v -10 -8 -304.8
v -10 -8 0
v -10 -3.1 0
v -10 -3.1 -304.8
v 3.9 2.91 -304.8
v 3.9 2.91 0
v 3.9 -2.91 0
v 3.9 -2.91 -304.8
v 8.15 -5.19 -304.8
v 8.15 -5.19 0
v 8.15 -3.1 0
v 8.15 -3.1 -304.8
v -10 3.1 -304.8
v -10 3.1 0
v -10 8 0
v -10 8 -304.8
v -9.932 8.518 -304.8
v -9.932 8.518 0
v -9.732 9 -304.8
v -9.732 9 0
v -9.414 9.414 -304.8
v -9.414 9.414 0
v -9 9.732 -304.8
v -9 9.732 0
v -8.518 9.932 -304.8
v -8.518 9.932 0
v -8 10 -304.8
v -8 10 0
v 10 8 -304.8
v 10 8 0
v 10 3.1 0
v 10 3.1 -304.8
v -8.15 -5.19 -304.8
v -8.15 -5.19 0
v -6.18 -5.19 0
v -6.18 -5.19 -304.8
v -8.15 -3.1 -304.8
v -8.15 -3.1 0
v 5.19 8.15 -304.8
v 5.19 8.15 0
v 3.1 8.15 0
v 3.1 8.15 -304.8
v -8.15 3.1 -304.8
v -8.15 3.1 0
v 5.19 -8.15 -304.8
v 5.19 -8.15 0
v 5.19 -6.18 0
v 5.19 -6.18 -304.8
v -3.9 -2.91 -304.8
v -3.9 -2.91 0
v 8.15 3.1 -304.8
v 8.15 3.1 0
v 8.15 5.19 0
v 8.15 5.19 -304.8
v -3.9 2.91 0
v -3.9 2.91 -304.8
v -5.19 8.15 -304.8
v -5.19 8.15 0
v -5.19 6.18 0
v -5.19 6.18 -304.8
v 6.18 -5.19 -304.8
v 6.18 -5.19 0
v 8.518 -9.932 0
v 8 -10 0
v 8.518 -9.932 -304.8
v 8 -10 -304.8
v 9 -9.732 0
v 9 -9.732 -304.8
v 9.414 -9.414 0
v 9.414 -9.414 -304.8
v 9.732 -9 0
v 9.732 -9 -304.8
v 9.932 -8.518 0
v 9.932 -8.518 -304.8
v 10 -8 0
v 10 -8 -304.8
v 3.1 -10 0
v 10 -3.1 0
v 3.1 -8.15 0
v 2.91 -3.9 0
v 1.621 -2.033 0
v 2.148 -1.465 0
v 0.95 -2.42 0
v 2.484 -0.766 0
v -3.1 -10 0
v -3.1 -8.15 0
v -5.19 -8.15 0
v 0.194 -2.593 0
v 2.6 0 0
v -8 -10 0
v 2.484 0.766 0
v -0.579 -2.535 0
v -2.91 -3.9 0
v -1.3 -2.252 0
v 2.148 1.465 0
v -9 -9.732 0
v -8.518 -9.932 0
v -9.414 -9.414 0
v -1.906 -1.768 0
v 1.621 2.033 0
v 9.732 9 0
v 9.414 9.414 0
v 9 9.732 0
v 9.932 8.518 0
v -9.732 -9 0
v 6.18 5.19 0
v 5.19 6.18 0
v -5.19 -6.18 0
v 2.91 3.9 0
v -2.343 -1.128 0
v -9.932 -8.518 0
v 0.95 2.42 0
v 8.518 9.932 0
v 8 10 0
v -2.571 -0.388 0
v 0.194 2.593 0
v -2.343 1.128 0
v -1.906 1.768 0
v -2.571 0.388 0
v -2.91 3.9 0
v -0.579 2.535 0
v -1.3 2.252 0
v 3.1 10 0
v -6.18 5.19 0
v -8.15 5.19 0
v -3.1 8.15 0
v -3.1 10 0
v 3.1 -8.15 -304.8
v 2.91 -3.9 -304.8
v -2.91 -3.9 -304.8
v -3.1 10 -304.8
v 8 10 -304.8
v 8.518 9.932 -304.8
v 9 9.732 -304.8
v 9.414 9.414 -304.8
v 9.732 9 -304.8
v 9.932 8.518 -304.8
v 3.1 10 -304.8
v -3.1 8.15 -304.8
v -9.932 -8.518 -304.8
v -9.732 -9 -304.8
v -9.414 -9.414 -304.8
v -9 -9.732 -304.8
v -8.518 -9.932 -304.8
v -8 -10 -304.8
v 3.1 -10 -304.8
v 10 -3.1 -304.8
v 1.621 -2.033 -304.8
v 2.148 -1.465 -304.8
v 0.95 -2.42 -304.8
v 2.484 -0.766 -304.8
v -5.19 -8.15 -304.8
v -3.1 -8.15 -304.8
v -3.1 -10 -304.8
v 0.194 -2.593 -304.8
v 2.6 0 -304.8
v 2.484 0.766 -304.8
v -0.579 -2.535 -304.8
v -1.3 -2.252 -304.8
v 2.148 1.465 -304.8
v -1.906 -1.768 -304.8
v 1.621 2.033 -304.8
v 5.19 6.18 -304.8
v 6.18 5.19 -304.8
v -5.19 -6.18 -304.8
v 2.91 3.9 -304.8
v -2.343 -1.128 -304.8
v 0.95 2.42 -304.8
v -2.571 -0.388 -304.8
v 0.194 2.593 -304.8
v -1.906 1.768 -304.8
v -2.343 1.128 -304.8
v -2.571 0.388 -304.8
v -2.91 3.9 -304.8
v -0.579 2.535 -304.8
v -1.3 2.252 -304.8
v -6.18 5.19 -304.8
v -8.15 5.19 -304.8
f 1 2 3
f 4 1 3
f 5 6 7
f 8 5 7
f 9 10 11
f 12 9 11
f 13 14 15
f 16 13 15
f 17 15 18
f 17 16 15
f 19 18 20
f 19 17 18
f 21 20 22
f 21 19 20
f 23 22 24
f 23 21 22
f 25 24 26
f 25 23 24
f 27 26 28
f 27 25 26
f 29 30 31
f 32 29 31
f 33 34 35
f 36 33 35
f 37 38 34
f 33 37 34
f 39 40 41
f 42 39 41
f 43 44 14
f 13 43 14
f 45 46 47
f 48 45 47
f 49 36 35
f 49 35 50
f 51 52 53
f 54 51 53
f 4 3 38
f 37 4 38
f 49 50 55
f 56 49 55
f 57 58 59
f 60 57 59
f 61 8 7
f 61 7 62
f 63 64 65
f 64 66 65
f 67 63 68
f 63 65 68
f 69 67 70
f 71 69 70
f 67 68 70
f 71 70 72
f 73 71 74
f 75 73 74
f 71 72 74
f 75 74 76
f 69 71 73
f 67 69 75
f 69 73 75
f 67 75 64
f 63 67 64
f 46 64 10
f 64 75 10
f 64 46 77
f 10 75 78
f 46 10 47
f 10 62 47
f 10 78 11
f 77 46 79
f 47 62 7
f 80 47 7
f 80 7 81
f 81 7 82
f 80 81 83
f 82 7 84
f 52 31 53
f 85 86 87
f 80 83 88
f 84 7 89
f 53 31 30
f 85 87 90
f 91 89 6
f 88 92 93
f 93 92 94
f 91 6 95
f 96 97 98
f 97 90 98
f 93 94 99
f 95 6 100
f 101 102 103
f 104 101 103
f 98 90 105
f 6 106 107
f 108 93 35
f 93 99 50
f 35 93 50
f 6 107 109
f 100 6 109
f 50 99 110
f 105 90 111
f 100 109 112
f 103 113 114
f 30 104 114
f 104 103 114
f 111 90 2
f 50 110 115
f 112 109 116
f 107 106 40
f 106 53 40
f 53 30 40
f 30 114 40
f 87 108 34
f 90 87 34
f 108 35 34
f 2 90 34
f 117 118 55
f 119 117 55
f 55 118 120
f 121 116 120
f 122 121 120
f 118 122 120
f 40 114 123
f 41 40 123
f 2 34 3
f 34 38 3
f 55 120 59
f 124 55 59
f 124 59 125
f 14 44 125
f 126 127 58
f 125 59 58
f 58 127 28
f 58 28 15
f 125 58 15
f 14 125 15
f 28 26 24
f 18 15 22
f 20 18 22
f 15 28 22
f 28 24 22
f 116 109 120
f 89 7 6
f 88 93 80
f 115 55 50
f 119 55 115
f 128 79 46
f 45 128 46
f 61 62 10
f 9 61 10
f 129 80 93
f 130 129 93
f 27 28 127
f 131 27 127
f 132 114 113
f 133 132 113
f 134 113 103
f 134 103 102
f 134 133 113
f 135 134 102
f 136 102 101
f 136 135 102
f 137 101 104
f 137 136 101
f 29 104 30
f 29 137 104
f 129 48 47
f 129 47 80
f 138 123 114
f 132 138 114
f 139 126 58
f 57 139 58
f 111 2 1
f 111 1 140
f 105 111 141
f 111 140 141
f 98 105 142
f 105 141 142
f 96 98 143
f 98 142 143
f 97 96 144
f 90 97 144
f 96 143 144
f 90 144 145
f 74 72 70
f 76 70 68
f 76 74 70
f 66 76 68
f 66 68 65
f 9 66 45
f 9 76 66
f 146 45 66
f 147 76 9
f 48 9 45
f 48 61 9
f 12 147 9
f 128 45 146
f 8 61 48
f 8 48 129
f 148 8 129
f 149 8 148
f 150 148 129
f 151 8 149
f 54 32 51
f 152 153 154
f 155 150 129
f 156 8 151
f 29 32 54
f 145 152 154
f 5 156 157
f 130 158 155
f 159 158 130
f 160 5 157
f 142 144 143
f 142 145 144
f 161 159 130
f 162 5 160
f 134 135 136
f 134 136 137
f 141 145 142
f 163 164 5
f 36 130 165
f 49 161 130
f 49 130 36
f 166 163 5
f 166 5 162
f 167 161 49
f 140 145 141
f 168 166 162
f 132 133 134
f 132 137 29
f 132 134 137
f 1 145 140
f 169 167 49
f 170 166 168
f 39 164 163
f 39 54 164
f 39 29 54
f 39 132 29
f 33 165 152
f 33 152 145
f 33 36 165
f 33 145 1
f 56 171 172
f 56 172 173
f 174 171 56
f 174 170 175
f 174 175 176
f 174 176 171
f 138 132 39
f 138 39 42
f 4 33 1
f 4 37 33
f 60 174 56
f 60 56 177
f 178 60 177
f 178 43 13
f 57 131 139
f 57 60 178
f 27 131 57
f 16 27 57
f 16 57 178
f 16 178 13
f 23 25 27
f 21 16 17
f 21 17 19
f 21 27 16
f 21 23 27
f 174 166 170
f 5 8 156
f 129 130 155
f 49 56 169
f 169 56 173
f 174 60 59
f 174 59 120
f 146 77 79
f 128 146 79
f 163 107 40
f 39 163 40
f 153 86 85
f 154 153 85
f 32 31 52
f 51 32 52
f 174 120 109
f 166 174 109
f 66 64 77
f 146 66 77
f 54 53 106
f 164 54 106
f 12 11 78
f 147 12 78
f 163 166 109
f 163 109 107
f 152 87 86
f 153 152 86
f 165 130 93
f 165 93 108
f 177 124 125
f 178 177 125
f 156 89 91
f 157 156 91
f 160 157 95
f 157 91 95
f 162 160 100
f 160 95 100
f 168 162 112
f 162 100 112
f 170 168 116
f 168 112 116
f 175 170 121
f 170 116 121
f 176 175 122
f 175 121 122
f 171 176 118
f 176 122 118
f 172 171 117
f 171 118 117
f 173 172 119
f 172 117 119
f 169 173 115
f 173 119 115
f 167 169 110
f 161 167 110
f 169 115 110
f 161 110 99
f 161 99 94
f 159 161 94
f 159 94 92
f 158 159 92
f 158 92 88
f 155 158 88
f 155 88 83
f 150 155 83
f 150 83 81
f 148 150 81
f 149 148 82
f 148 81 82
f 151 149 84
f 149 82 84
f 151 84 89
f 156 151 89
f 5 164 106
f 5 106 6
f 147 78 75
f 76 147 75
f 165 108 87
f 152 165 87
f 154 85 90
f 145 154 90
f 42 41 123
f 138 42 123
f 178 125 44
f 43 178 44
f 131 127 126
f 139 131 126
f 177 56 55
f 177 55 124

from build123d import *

# Parameters (mm, degrees)
SKETCH1_R           = 2.6
BOSS_EXTRUDE1_DEPTH = 304.8
FILLET1_R           = 2


with BuildPart() as part:
    # Sketch1 → Boss-Extrude1 (new body)
    with BuildSketch(Plane.XY):
        Polygon((-3.9, 2.910050506), (-6.179949494, 5.19), (-8.15, 5.19), (-8.15, 3.1), (-10, 3.1), (-10, 10), (-3.1, 10), (-3.1, 8.15), (-5.19, 8.15), (-5.19, 6.179949494), (-2.910050506, 3.9), (2.910050506, 3.9), (5.19, 6.179949494), (5.19, 8.15), (3.1, 8.15), (3.1, 10), (10, 10), (10, 3.1), (8.15, 3.1), (8.15, 5.19), (6.179949494, 5.19), (3.9, 2.910050506), (3.9, -2.910050506), (6.179949494, -5.19), (8.15, -5.19), (8.15, -3.1), (10, -3.1), (10, -10), (3.1, -10), (3.1, -8.15), (5.19, -8.15), (5.19, -6.179949494), (2.910050506, -3.9), (-2.910050506, -3.9), (-5.19, -6.179949494), (-5.19, -8.15), (-3.1, -8.15), (-3.1, -10), (-10, -10), (-10, -3.1), (-8.15, -3.1), (-8.15, -5.19), (-6.179949494, -5.19), (-3.9, -2.910050506), align=None)
        Circle(SKETCH1_R, mode=Mode.SUBTRACT)
    extrude(amount=-BOSS_EXTRUDE1_DEPTH)

    # Fillet1
    fillet1_edges = [part.edges().sort_by_distance(p)[0] for p in [
        (-10, 10, -152.4),
        (10, 10, -152.4),
        (10, -10, -152.4),
        (-10, -10, -152.4),
    ]]
    fillet(fillet1_edges, radius=FILLET1_R)


solid = part.part
